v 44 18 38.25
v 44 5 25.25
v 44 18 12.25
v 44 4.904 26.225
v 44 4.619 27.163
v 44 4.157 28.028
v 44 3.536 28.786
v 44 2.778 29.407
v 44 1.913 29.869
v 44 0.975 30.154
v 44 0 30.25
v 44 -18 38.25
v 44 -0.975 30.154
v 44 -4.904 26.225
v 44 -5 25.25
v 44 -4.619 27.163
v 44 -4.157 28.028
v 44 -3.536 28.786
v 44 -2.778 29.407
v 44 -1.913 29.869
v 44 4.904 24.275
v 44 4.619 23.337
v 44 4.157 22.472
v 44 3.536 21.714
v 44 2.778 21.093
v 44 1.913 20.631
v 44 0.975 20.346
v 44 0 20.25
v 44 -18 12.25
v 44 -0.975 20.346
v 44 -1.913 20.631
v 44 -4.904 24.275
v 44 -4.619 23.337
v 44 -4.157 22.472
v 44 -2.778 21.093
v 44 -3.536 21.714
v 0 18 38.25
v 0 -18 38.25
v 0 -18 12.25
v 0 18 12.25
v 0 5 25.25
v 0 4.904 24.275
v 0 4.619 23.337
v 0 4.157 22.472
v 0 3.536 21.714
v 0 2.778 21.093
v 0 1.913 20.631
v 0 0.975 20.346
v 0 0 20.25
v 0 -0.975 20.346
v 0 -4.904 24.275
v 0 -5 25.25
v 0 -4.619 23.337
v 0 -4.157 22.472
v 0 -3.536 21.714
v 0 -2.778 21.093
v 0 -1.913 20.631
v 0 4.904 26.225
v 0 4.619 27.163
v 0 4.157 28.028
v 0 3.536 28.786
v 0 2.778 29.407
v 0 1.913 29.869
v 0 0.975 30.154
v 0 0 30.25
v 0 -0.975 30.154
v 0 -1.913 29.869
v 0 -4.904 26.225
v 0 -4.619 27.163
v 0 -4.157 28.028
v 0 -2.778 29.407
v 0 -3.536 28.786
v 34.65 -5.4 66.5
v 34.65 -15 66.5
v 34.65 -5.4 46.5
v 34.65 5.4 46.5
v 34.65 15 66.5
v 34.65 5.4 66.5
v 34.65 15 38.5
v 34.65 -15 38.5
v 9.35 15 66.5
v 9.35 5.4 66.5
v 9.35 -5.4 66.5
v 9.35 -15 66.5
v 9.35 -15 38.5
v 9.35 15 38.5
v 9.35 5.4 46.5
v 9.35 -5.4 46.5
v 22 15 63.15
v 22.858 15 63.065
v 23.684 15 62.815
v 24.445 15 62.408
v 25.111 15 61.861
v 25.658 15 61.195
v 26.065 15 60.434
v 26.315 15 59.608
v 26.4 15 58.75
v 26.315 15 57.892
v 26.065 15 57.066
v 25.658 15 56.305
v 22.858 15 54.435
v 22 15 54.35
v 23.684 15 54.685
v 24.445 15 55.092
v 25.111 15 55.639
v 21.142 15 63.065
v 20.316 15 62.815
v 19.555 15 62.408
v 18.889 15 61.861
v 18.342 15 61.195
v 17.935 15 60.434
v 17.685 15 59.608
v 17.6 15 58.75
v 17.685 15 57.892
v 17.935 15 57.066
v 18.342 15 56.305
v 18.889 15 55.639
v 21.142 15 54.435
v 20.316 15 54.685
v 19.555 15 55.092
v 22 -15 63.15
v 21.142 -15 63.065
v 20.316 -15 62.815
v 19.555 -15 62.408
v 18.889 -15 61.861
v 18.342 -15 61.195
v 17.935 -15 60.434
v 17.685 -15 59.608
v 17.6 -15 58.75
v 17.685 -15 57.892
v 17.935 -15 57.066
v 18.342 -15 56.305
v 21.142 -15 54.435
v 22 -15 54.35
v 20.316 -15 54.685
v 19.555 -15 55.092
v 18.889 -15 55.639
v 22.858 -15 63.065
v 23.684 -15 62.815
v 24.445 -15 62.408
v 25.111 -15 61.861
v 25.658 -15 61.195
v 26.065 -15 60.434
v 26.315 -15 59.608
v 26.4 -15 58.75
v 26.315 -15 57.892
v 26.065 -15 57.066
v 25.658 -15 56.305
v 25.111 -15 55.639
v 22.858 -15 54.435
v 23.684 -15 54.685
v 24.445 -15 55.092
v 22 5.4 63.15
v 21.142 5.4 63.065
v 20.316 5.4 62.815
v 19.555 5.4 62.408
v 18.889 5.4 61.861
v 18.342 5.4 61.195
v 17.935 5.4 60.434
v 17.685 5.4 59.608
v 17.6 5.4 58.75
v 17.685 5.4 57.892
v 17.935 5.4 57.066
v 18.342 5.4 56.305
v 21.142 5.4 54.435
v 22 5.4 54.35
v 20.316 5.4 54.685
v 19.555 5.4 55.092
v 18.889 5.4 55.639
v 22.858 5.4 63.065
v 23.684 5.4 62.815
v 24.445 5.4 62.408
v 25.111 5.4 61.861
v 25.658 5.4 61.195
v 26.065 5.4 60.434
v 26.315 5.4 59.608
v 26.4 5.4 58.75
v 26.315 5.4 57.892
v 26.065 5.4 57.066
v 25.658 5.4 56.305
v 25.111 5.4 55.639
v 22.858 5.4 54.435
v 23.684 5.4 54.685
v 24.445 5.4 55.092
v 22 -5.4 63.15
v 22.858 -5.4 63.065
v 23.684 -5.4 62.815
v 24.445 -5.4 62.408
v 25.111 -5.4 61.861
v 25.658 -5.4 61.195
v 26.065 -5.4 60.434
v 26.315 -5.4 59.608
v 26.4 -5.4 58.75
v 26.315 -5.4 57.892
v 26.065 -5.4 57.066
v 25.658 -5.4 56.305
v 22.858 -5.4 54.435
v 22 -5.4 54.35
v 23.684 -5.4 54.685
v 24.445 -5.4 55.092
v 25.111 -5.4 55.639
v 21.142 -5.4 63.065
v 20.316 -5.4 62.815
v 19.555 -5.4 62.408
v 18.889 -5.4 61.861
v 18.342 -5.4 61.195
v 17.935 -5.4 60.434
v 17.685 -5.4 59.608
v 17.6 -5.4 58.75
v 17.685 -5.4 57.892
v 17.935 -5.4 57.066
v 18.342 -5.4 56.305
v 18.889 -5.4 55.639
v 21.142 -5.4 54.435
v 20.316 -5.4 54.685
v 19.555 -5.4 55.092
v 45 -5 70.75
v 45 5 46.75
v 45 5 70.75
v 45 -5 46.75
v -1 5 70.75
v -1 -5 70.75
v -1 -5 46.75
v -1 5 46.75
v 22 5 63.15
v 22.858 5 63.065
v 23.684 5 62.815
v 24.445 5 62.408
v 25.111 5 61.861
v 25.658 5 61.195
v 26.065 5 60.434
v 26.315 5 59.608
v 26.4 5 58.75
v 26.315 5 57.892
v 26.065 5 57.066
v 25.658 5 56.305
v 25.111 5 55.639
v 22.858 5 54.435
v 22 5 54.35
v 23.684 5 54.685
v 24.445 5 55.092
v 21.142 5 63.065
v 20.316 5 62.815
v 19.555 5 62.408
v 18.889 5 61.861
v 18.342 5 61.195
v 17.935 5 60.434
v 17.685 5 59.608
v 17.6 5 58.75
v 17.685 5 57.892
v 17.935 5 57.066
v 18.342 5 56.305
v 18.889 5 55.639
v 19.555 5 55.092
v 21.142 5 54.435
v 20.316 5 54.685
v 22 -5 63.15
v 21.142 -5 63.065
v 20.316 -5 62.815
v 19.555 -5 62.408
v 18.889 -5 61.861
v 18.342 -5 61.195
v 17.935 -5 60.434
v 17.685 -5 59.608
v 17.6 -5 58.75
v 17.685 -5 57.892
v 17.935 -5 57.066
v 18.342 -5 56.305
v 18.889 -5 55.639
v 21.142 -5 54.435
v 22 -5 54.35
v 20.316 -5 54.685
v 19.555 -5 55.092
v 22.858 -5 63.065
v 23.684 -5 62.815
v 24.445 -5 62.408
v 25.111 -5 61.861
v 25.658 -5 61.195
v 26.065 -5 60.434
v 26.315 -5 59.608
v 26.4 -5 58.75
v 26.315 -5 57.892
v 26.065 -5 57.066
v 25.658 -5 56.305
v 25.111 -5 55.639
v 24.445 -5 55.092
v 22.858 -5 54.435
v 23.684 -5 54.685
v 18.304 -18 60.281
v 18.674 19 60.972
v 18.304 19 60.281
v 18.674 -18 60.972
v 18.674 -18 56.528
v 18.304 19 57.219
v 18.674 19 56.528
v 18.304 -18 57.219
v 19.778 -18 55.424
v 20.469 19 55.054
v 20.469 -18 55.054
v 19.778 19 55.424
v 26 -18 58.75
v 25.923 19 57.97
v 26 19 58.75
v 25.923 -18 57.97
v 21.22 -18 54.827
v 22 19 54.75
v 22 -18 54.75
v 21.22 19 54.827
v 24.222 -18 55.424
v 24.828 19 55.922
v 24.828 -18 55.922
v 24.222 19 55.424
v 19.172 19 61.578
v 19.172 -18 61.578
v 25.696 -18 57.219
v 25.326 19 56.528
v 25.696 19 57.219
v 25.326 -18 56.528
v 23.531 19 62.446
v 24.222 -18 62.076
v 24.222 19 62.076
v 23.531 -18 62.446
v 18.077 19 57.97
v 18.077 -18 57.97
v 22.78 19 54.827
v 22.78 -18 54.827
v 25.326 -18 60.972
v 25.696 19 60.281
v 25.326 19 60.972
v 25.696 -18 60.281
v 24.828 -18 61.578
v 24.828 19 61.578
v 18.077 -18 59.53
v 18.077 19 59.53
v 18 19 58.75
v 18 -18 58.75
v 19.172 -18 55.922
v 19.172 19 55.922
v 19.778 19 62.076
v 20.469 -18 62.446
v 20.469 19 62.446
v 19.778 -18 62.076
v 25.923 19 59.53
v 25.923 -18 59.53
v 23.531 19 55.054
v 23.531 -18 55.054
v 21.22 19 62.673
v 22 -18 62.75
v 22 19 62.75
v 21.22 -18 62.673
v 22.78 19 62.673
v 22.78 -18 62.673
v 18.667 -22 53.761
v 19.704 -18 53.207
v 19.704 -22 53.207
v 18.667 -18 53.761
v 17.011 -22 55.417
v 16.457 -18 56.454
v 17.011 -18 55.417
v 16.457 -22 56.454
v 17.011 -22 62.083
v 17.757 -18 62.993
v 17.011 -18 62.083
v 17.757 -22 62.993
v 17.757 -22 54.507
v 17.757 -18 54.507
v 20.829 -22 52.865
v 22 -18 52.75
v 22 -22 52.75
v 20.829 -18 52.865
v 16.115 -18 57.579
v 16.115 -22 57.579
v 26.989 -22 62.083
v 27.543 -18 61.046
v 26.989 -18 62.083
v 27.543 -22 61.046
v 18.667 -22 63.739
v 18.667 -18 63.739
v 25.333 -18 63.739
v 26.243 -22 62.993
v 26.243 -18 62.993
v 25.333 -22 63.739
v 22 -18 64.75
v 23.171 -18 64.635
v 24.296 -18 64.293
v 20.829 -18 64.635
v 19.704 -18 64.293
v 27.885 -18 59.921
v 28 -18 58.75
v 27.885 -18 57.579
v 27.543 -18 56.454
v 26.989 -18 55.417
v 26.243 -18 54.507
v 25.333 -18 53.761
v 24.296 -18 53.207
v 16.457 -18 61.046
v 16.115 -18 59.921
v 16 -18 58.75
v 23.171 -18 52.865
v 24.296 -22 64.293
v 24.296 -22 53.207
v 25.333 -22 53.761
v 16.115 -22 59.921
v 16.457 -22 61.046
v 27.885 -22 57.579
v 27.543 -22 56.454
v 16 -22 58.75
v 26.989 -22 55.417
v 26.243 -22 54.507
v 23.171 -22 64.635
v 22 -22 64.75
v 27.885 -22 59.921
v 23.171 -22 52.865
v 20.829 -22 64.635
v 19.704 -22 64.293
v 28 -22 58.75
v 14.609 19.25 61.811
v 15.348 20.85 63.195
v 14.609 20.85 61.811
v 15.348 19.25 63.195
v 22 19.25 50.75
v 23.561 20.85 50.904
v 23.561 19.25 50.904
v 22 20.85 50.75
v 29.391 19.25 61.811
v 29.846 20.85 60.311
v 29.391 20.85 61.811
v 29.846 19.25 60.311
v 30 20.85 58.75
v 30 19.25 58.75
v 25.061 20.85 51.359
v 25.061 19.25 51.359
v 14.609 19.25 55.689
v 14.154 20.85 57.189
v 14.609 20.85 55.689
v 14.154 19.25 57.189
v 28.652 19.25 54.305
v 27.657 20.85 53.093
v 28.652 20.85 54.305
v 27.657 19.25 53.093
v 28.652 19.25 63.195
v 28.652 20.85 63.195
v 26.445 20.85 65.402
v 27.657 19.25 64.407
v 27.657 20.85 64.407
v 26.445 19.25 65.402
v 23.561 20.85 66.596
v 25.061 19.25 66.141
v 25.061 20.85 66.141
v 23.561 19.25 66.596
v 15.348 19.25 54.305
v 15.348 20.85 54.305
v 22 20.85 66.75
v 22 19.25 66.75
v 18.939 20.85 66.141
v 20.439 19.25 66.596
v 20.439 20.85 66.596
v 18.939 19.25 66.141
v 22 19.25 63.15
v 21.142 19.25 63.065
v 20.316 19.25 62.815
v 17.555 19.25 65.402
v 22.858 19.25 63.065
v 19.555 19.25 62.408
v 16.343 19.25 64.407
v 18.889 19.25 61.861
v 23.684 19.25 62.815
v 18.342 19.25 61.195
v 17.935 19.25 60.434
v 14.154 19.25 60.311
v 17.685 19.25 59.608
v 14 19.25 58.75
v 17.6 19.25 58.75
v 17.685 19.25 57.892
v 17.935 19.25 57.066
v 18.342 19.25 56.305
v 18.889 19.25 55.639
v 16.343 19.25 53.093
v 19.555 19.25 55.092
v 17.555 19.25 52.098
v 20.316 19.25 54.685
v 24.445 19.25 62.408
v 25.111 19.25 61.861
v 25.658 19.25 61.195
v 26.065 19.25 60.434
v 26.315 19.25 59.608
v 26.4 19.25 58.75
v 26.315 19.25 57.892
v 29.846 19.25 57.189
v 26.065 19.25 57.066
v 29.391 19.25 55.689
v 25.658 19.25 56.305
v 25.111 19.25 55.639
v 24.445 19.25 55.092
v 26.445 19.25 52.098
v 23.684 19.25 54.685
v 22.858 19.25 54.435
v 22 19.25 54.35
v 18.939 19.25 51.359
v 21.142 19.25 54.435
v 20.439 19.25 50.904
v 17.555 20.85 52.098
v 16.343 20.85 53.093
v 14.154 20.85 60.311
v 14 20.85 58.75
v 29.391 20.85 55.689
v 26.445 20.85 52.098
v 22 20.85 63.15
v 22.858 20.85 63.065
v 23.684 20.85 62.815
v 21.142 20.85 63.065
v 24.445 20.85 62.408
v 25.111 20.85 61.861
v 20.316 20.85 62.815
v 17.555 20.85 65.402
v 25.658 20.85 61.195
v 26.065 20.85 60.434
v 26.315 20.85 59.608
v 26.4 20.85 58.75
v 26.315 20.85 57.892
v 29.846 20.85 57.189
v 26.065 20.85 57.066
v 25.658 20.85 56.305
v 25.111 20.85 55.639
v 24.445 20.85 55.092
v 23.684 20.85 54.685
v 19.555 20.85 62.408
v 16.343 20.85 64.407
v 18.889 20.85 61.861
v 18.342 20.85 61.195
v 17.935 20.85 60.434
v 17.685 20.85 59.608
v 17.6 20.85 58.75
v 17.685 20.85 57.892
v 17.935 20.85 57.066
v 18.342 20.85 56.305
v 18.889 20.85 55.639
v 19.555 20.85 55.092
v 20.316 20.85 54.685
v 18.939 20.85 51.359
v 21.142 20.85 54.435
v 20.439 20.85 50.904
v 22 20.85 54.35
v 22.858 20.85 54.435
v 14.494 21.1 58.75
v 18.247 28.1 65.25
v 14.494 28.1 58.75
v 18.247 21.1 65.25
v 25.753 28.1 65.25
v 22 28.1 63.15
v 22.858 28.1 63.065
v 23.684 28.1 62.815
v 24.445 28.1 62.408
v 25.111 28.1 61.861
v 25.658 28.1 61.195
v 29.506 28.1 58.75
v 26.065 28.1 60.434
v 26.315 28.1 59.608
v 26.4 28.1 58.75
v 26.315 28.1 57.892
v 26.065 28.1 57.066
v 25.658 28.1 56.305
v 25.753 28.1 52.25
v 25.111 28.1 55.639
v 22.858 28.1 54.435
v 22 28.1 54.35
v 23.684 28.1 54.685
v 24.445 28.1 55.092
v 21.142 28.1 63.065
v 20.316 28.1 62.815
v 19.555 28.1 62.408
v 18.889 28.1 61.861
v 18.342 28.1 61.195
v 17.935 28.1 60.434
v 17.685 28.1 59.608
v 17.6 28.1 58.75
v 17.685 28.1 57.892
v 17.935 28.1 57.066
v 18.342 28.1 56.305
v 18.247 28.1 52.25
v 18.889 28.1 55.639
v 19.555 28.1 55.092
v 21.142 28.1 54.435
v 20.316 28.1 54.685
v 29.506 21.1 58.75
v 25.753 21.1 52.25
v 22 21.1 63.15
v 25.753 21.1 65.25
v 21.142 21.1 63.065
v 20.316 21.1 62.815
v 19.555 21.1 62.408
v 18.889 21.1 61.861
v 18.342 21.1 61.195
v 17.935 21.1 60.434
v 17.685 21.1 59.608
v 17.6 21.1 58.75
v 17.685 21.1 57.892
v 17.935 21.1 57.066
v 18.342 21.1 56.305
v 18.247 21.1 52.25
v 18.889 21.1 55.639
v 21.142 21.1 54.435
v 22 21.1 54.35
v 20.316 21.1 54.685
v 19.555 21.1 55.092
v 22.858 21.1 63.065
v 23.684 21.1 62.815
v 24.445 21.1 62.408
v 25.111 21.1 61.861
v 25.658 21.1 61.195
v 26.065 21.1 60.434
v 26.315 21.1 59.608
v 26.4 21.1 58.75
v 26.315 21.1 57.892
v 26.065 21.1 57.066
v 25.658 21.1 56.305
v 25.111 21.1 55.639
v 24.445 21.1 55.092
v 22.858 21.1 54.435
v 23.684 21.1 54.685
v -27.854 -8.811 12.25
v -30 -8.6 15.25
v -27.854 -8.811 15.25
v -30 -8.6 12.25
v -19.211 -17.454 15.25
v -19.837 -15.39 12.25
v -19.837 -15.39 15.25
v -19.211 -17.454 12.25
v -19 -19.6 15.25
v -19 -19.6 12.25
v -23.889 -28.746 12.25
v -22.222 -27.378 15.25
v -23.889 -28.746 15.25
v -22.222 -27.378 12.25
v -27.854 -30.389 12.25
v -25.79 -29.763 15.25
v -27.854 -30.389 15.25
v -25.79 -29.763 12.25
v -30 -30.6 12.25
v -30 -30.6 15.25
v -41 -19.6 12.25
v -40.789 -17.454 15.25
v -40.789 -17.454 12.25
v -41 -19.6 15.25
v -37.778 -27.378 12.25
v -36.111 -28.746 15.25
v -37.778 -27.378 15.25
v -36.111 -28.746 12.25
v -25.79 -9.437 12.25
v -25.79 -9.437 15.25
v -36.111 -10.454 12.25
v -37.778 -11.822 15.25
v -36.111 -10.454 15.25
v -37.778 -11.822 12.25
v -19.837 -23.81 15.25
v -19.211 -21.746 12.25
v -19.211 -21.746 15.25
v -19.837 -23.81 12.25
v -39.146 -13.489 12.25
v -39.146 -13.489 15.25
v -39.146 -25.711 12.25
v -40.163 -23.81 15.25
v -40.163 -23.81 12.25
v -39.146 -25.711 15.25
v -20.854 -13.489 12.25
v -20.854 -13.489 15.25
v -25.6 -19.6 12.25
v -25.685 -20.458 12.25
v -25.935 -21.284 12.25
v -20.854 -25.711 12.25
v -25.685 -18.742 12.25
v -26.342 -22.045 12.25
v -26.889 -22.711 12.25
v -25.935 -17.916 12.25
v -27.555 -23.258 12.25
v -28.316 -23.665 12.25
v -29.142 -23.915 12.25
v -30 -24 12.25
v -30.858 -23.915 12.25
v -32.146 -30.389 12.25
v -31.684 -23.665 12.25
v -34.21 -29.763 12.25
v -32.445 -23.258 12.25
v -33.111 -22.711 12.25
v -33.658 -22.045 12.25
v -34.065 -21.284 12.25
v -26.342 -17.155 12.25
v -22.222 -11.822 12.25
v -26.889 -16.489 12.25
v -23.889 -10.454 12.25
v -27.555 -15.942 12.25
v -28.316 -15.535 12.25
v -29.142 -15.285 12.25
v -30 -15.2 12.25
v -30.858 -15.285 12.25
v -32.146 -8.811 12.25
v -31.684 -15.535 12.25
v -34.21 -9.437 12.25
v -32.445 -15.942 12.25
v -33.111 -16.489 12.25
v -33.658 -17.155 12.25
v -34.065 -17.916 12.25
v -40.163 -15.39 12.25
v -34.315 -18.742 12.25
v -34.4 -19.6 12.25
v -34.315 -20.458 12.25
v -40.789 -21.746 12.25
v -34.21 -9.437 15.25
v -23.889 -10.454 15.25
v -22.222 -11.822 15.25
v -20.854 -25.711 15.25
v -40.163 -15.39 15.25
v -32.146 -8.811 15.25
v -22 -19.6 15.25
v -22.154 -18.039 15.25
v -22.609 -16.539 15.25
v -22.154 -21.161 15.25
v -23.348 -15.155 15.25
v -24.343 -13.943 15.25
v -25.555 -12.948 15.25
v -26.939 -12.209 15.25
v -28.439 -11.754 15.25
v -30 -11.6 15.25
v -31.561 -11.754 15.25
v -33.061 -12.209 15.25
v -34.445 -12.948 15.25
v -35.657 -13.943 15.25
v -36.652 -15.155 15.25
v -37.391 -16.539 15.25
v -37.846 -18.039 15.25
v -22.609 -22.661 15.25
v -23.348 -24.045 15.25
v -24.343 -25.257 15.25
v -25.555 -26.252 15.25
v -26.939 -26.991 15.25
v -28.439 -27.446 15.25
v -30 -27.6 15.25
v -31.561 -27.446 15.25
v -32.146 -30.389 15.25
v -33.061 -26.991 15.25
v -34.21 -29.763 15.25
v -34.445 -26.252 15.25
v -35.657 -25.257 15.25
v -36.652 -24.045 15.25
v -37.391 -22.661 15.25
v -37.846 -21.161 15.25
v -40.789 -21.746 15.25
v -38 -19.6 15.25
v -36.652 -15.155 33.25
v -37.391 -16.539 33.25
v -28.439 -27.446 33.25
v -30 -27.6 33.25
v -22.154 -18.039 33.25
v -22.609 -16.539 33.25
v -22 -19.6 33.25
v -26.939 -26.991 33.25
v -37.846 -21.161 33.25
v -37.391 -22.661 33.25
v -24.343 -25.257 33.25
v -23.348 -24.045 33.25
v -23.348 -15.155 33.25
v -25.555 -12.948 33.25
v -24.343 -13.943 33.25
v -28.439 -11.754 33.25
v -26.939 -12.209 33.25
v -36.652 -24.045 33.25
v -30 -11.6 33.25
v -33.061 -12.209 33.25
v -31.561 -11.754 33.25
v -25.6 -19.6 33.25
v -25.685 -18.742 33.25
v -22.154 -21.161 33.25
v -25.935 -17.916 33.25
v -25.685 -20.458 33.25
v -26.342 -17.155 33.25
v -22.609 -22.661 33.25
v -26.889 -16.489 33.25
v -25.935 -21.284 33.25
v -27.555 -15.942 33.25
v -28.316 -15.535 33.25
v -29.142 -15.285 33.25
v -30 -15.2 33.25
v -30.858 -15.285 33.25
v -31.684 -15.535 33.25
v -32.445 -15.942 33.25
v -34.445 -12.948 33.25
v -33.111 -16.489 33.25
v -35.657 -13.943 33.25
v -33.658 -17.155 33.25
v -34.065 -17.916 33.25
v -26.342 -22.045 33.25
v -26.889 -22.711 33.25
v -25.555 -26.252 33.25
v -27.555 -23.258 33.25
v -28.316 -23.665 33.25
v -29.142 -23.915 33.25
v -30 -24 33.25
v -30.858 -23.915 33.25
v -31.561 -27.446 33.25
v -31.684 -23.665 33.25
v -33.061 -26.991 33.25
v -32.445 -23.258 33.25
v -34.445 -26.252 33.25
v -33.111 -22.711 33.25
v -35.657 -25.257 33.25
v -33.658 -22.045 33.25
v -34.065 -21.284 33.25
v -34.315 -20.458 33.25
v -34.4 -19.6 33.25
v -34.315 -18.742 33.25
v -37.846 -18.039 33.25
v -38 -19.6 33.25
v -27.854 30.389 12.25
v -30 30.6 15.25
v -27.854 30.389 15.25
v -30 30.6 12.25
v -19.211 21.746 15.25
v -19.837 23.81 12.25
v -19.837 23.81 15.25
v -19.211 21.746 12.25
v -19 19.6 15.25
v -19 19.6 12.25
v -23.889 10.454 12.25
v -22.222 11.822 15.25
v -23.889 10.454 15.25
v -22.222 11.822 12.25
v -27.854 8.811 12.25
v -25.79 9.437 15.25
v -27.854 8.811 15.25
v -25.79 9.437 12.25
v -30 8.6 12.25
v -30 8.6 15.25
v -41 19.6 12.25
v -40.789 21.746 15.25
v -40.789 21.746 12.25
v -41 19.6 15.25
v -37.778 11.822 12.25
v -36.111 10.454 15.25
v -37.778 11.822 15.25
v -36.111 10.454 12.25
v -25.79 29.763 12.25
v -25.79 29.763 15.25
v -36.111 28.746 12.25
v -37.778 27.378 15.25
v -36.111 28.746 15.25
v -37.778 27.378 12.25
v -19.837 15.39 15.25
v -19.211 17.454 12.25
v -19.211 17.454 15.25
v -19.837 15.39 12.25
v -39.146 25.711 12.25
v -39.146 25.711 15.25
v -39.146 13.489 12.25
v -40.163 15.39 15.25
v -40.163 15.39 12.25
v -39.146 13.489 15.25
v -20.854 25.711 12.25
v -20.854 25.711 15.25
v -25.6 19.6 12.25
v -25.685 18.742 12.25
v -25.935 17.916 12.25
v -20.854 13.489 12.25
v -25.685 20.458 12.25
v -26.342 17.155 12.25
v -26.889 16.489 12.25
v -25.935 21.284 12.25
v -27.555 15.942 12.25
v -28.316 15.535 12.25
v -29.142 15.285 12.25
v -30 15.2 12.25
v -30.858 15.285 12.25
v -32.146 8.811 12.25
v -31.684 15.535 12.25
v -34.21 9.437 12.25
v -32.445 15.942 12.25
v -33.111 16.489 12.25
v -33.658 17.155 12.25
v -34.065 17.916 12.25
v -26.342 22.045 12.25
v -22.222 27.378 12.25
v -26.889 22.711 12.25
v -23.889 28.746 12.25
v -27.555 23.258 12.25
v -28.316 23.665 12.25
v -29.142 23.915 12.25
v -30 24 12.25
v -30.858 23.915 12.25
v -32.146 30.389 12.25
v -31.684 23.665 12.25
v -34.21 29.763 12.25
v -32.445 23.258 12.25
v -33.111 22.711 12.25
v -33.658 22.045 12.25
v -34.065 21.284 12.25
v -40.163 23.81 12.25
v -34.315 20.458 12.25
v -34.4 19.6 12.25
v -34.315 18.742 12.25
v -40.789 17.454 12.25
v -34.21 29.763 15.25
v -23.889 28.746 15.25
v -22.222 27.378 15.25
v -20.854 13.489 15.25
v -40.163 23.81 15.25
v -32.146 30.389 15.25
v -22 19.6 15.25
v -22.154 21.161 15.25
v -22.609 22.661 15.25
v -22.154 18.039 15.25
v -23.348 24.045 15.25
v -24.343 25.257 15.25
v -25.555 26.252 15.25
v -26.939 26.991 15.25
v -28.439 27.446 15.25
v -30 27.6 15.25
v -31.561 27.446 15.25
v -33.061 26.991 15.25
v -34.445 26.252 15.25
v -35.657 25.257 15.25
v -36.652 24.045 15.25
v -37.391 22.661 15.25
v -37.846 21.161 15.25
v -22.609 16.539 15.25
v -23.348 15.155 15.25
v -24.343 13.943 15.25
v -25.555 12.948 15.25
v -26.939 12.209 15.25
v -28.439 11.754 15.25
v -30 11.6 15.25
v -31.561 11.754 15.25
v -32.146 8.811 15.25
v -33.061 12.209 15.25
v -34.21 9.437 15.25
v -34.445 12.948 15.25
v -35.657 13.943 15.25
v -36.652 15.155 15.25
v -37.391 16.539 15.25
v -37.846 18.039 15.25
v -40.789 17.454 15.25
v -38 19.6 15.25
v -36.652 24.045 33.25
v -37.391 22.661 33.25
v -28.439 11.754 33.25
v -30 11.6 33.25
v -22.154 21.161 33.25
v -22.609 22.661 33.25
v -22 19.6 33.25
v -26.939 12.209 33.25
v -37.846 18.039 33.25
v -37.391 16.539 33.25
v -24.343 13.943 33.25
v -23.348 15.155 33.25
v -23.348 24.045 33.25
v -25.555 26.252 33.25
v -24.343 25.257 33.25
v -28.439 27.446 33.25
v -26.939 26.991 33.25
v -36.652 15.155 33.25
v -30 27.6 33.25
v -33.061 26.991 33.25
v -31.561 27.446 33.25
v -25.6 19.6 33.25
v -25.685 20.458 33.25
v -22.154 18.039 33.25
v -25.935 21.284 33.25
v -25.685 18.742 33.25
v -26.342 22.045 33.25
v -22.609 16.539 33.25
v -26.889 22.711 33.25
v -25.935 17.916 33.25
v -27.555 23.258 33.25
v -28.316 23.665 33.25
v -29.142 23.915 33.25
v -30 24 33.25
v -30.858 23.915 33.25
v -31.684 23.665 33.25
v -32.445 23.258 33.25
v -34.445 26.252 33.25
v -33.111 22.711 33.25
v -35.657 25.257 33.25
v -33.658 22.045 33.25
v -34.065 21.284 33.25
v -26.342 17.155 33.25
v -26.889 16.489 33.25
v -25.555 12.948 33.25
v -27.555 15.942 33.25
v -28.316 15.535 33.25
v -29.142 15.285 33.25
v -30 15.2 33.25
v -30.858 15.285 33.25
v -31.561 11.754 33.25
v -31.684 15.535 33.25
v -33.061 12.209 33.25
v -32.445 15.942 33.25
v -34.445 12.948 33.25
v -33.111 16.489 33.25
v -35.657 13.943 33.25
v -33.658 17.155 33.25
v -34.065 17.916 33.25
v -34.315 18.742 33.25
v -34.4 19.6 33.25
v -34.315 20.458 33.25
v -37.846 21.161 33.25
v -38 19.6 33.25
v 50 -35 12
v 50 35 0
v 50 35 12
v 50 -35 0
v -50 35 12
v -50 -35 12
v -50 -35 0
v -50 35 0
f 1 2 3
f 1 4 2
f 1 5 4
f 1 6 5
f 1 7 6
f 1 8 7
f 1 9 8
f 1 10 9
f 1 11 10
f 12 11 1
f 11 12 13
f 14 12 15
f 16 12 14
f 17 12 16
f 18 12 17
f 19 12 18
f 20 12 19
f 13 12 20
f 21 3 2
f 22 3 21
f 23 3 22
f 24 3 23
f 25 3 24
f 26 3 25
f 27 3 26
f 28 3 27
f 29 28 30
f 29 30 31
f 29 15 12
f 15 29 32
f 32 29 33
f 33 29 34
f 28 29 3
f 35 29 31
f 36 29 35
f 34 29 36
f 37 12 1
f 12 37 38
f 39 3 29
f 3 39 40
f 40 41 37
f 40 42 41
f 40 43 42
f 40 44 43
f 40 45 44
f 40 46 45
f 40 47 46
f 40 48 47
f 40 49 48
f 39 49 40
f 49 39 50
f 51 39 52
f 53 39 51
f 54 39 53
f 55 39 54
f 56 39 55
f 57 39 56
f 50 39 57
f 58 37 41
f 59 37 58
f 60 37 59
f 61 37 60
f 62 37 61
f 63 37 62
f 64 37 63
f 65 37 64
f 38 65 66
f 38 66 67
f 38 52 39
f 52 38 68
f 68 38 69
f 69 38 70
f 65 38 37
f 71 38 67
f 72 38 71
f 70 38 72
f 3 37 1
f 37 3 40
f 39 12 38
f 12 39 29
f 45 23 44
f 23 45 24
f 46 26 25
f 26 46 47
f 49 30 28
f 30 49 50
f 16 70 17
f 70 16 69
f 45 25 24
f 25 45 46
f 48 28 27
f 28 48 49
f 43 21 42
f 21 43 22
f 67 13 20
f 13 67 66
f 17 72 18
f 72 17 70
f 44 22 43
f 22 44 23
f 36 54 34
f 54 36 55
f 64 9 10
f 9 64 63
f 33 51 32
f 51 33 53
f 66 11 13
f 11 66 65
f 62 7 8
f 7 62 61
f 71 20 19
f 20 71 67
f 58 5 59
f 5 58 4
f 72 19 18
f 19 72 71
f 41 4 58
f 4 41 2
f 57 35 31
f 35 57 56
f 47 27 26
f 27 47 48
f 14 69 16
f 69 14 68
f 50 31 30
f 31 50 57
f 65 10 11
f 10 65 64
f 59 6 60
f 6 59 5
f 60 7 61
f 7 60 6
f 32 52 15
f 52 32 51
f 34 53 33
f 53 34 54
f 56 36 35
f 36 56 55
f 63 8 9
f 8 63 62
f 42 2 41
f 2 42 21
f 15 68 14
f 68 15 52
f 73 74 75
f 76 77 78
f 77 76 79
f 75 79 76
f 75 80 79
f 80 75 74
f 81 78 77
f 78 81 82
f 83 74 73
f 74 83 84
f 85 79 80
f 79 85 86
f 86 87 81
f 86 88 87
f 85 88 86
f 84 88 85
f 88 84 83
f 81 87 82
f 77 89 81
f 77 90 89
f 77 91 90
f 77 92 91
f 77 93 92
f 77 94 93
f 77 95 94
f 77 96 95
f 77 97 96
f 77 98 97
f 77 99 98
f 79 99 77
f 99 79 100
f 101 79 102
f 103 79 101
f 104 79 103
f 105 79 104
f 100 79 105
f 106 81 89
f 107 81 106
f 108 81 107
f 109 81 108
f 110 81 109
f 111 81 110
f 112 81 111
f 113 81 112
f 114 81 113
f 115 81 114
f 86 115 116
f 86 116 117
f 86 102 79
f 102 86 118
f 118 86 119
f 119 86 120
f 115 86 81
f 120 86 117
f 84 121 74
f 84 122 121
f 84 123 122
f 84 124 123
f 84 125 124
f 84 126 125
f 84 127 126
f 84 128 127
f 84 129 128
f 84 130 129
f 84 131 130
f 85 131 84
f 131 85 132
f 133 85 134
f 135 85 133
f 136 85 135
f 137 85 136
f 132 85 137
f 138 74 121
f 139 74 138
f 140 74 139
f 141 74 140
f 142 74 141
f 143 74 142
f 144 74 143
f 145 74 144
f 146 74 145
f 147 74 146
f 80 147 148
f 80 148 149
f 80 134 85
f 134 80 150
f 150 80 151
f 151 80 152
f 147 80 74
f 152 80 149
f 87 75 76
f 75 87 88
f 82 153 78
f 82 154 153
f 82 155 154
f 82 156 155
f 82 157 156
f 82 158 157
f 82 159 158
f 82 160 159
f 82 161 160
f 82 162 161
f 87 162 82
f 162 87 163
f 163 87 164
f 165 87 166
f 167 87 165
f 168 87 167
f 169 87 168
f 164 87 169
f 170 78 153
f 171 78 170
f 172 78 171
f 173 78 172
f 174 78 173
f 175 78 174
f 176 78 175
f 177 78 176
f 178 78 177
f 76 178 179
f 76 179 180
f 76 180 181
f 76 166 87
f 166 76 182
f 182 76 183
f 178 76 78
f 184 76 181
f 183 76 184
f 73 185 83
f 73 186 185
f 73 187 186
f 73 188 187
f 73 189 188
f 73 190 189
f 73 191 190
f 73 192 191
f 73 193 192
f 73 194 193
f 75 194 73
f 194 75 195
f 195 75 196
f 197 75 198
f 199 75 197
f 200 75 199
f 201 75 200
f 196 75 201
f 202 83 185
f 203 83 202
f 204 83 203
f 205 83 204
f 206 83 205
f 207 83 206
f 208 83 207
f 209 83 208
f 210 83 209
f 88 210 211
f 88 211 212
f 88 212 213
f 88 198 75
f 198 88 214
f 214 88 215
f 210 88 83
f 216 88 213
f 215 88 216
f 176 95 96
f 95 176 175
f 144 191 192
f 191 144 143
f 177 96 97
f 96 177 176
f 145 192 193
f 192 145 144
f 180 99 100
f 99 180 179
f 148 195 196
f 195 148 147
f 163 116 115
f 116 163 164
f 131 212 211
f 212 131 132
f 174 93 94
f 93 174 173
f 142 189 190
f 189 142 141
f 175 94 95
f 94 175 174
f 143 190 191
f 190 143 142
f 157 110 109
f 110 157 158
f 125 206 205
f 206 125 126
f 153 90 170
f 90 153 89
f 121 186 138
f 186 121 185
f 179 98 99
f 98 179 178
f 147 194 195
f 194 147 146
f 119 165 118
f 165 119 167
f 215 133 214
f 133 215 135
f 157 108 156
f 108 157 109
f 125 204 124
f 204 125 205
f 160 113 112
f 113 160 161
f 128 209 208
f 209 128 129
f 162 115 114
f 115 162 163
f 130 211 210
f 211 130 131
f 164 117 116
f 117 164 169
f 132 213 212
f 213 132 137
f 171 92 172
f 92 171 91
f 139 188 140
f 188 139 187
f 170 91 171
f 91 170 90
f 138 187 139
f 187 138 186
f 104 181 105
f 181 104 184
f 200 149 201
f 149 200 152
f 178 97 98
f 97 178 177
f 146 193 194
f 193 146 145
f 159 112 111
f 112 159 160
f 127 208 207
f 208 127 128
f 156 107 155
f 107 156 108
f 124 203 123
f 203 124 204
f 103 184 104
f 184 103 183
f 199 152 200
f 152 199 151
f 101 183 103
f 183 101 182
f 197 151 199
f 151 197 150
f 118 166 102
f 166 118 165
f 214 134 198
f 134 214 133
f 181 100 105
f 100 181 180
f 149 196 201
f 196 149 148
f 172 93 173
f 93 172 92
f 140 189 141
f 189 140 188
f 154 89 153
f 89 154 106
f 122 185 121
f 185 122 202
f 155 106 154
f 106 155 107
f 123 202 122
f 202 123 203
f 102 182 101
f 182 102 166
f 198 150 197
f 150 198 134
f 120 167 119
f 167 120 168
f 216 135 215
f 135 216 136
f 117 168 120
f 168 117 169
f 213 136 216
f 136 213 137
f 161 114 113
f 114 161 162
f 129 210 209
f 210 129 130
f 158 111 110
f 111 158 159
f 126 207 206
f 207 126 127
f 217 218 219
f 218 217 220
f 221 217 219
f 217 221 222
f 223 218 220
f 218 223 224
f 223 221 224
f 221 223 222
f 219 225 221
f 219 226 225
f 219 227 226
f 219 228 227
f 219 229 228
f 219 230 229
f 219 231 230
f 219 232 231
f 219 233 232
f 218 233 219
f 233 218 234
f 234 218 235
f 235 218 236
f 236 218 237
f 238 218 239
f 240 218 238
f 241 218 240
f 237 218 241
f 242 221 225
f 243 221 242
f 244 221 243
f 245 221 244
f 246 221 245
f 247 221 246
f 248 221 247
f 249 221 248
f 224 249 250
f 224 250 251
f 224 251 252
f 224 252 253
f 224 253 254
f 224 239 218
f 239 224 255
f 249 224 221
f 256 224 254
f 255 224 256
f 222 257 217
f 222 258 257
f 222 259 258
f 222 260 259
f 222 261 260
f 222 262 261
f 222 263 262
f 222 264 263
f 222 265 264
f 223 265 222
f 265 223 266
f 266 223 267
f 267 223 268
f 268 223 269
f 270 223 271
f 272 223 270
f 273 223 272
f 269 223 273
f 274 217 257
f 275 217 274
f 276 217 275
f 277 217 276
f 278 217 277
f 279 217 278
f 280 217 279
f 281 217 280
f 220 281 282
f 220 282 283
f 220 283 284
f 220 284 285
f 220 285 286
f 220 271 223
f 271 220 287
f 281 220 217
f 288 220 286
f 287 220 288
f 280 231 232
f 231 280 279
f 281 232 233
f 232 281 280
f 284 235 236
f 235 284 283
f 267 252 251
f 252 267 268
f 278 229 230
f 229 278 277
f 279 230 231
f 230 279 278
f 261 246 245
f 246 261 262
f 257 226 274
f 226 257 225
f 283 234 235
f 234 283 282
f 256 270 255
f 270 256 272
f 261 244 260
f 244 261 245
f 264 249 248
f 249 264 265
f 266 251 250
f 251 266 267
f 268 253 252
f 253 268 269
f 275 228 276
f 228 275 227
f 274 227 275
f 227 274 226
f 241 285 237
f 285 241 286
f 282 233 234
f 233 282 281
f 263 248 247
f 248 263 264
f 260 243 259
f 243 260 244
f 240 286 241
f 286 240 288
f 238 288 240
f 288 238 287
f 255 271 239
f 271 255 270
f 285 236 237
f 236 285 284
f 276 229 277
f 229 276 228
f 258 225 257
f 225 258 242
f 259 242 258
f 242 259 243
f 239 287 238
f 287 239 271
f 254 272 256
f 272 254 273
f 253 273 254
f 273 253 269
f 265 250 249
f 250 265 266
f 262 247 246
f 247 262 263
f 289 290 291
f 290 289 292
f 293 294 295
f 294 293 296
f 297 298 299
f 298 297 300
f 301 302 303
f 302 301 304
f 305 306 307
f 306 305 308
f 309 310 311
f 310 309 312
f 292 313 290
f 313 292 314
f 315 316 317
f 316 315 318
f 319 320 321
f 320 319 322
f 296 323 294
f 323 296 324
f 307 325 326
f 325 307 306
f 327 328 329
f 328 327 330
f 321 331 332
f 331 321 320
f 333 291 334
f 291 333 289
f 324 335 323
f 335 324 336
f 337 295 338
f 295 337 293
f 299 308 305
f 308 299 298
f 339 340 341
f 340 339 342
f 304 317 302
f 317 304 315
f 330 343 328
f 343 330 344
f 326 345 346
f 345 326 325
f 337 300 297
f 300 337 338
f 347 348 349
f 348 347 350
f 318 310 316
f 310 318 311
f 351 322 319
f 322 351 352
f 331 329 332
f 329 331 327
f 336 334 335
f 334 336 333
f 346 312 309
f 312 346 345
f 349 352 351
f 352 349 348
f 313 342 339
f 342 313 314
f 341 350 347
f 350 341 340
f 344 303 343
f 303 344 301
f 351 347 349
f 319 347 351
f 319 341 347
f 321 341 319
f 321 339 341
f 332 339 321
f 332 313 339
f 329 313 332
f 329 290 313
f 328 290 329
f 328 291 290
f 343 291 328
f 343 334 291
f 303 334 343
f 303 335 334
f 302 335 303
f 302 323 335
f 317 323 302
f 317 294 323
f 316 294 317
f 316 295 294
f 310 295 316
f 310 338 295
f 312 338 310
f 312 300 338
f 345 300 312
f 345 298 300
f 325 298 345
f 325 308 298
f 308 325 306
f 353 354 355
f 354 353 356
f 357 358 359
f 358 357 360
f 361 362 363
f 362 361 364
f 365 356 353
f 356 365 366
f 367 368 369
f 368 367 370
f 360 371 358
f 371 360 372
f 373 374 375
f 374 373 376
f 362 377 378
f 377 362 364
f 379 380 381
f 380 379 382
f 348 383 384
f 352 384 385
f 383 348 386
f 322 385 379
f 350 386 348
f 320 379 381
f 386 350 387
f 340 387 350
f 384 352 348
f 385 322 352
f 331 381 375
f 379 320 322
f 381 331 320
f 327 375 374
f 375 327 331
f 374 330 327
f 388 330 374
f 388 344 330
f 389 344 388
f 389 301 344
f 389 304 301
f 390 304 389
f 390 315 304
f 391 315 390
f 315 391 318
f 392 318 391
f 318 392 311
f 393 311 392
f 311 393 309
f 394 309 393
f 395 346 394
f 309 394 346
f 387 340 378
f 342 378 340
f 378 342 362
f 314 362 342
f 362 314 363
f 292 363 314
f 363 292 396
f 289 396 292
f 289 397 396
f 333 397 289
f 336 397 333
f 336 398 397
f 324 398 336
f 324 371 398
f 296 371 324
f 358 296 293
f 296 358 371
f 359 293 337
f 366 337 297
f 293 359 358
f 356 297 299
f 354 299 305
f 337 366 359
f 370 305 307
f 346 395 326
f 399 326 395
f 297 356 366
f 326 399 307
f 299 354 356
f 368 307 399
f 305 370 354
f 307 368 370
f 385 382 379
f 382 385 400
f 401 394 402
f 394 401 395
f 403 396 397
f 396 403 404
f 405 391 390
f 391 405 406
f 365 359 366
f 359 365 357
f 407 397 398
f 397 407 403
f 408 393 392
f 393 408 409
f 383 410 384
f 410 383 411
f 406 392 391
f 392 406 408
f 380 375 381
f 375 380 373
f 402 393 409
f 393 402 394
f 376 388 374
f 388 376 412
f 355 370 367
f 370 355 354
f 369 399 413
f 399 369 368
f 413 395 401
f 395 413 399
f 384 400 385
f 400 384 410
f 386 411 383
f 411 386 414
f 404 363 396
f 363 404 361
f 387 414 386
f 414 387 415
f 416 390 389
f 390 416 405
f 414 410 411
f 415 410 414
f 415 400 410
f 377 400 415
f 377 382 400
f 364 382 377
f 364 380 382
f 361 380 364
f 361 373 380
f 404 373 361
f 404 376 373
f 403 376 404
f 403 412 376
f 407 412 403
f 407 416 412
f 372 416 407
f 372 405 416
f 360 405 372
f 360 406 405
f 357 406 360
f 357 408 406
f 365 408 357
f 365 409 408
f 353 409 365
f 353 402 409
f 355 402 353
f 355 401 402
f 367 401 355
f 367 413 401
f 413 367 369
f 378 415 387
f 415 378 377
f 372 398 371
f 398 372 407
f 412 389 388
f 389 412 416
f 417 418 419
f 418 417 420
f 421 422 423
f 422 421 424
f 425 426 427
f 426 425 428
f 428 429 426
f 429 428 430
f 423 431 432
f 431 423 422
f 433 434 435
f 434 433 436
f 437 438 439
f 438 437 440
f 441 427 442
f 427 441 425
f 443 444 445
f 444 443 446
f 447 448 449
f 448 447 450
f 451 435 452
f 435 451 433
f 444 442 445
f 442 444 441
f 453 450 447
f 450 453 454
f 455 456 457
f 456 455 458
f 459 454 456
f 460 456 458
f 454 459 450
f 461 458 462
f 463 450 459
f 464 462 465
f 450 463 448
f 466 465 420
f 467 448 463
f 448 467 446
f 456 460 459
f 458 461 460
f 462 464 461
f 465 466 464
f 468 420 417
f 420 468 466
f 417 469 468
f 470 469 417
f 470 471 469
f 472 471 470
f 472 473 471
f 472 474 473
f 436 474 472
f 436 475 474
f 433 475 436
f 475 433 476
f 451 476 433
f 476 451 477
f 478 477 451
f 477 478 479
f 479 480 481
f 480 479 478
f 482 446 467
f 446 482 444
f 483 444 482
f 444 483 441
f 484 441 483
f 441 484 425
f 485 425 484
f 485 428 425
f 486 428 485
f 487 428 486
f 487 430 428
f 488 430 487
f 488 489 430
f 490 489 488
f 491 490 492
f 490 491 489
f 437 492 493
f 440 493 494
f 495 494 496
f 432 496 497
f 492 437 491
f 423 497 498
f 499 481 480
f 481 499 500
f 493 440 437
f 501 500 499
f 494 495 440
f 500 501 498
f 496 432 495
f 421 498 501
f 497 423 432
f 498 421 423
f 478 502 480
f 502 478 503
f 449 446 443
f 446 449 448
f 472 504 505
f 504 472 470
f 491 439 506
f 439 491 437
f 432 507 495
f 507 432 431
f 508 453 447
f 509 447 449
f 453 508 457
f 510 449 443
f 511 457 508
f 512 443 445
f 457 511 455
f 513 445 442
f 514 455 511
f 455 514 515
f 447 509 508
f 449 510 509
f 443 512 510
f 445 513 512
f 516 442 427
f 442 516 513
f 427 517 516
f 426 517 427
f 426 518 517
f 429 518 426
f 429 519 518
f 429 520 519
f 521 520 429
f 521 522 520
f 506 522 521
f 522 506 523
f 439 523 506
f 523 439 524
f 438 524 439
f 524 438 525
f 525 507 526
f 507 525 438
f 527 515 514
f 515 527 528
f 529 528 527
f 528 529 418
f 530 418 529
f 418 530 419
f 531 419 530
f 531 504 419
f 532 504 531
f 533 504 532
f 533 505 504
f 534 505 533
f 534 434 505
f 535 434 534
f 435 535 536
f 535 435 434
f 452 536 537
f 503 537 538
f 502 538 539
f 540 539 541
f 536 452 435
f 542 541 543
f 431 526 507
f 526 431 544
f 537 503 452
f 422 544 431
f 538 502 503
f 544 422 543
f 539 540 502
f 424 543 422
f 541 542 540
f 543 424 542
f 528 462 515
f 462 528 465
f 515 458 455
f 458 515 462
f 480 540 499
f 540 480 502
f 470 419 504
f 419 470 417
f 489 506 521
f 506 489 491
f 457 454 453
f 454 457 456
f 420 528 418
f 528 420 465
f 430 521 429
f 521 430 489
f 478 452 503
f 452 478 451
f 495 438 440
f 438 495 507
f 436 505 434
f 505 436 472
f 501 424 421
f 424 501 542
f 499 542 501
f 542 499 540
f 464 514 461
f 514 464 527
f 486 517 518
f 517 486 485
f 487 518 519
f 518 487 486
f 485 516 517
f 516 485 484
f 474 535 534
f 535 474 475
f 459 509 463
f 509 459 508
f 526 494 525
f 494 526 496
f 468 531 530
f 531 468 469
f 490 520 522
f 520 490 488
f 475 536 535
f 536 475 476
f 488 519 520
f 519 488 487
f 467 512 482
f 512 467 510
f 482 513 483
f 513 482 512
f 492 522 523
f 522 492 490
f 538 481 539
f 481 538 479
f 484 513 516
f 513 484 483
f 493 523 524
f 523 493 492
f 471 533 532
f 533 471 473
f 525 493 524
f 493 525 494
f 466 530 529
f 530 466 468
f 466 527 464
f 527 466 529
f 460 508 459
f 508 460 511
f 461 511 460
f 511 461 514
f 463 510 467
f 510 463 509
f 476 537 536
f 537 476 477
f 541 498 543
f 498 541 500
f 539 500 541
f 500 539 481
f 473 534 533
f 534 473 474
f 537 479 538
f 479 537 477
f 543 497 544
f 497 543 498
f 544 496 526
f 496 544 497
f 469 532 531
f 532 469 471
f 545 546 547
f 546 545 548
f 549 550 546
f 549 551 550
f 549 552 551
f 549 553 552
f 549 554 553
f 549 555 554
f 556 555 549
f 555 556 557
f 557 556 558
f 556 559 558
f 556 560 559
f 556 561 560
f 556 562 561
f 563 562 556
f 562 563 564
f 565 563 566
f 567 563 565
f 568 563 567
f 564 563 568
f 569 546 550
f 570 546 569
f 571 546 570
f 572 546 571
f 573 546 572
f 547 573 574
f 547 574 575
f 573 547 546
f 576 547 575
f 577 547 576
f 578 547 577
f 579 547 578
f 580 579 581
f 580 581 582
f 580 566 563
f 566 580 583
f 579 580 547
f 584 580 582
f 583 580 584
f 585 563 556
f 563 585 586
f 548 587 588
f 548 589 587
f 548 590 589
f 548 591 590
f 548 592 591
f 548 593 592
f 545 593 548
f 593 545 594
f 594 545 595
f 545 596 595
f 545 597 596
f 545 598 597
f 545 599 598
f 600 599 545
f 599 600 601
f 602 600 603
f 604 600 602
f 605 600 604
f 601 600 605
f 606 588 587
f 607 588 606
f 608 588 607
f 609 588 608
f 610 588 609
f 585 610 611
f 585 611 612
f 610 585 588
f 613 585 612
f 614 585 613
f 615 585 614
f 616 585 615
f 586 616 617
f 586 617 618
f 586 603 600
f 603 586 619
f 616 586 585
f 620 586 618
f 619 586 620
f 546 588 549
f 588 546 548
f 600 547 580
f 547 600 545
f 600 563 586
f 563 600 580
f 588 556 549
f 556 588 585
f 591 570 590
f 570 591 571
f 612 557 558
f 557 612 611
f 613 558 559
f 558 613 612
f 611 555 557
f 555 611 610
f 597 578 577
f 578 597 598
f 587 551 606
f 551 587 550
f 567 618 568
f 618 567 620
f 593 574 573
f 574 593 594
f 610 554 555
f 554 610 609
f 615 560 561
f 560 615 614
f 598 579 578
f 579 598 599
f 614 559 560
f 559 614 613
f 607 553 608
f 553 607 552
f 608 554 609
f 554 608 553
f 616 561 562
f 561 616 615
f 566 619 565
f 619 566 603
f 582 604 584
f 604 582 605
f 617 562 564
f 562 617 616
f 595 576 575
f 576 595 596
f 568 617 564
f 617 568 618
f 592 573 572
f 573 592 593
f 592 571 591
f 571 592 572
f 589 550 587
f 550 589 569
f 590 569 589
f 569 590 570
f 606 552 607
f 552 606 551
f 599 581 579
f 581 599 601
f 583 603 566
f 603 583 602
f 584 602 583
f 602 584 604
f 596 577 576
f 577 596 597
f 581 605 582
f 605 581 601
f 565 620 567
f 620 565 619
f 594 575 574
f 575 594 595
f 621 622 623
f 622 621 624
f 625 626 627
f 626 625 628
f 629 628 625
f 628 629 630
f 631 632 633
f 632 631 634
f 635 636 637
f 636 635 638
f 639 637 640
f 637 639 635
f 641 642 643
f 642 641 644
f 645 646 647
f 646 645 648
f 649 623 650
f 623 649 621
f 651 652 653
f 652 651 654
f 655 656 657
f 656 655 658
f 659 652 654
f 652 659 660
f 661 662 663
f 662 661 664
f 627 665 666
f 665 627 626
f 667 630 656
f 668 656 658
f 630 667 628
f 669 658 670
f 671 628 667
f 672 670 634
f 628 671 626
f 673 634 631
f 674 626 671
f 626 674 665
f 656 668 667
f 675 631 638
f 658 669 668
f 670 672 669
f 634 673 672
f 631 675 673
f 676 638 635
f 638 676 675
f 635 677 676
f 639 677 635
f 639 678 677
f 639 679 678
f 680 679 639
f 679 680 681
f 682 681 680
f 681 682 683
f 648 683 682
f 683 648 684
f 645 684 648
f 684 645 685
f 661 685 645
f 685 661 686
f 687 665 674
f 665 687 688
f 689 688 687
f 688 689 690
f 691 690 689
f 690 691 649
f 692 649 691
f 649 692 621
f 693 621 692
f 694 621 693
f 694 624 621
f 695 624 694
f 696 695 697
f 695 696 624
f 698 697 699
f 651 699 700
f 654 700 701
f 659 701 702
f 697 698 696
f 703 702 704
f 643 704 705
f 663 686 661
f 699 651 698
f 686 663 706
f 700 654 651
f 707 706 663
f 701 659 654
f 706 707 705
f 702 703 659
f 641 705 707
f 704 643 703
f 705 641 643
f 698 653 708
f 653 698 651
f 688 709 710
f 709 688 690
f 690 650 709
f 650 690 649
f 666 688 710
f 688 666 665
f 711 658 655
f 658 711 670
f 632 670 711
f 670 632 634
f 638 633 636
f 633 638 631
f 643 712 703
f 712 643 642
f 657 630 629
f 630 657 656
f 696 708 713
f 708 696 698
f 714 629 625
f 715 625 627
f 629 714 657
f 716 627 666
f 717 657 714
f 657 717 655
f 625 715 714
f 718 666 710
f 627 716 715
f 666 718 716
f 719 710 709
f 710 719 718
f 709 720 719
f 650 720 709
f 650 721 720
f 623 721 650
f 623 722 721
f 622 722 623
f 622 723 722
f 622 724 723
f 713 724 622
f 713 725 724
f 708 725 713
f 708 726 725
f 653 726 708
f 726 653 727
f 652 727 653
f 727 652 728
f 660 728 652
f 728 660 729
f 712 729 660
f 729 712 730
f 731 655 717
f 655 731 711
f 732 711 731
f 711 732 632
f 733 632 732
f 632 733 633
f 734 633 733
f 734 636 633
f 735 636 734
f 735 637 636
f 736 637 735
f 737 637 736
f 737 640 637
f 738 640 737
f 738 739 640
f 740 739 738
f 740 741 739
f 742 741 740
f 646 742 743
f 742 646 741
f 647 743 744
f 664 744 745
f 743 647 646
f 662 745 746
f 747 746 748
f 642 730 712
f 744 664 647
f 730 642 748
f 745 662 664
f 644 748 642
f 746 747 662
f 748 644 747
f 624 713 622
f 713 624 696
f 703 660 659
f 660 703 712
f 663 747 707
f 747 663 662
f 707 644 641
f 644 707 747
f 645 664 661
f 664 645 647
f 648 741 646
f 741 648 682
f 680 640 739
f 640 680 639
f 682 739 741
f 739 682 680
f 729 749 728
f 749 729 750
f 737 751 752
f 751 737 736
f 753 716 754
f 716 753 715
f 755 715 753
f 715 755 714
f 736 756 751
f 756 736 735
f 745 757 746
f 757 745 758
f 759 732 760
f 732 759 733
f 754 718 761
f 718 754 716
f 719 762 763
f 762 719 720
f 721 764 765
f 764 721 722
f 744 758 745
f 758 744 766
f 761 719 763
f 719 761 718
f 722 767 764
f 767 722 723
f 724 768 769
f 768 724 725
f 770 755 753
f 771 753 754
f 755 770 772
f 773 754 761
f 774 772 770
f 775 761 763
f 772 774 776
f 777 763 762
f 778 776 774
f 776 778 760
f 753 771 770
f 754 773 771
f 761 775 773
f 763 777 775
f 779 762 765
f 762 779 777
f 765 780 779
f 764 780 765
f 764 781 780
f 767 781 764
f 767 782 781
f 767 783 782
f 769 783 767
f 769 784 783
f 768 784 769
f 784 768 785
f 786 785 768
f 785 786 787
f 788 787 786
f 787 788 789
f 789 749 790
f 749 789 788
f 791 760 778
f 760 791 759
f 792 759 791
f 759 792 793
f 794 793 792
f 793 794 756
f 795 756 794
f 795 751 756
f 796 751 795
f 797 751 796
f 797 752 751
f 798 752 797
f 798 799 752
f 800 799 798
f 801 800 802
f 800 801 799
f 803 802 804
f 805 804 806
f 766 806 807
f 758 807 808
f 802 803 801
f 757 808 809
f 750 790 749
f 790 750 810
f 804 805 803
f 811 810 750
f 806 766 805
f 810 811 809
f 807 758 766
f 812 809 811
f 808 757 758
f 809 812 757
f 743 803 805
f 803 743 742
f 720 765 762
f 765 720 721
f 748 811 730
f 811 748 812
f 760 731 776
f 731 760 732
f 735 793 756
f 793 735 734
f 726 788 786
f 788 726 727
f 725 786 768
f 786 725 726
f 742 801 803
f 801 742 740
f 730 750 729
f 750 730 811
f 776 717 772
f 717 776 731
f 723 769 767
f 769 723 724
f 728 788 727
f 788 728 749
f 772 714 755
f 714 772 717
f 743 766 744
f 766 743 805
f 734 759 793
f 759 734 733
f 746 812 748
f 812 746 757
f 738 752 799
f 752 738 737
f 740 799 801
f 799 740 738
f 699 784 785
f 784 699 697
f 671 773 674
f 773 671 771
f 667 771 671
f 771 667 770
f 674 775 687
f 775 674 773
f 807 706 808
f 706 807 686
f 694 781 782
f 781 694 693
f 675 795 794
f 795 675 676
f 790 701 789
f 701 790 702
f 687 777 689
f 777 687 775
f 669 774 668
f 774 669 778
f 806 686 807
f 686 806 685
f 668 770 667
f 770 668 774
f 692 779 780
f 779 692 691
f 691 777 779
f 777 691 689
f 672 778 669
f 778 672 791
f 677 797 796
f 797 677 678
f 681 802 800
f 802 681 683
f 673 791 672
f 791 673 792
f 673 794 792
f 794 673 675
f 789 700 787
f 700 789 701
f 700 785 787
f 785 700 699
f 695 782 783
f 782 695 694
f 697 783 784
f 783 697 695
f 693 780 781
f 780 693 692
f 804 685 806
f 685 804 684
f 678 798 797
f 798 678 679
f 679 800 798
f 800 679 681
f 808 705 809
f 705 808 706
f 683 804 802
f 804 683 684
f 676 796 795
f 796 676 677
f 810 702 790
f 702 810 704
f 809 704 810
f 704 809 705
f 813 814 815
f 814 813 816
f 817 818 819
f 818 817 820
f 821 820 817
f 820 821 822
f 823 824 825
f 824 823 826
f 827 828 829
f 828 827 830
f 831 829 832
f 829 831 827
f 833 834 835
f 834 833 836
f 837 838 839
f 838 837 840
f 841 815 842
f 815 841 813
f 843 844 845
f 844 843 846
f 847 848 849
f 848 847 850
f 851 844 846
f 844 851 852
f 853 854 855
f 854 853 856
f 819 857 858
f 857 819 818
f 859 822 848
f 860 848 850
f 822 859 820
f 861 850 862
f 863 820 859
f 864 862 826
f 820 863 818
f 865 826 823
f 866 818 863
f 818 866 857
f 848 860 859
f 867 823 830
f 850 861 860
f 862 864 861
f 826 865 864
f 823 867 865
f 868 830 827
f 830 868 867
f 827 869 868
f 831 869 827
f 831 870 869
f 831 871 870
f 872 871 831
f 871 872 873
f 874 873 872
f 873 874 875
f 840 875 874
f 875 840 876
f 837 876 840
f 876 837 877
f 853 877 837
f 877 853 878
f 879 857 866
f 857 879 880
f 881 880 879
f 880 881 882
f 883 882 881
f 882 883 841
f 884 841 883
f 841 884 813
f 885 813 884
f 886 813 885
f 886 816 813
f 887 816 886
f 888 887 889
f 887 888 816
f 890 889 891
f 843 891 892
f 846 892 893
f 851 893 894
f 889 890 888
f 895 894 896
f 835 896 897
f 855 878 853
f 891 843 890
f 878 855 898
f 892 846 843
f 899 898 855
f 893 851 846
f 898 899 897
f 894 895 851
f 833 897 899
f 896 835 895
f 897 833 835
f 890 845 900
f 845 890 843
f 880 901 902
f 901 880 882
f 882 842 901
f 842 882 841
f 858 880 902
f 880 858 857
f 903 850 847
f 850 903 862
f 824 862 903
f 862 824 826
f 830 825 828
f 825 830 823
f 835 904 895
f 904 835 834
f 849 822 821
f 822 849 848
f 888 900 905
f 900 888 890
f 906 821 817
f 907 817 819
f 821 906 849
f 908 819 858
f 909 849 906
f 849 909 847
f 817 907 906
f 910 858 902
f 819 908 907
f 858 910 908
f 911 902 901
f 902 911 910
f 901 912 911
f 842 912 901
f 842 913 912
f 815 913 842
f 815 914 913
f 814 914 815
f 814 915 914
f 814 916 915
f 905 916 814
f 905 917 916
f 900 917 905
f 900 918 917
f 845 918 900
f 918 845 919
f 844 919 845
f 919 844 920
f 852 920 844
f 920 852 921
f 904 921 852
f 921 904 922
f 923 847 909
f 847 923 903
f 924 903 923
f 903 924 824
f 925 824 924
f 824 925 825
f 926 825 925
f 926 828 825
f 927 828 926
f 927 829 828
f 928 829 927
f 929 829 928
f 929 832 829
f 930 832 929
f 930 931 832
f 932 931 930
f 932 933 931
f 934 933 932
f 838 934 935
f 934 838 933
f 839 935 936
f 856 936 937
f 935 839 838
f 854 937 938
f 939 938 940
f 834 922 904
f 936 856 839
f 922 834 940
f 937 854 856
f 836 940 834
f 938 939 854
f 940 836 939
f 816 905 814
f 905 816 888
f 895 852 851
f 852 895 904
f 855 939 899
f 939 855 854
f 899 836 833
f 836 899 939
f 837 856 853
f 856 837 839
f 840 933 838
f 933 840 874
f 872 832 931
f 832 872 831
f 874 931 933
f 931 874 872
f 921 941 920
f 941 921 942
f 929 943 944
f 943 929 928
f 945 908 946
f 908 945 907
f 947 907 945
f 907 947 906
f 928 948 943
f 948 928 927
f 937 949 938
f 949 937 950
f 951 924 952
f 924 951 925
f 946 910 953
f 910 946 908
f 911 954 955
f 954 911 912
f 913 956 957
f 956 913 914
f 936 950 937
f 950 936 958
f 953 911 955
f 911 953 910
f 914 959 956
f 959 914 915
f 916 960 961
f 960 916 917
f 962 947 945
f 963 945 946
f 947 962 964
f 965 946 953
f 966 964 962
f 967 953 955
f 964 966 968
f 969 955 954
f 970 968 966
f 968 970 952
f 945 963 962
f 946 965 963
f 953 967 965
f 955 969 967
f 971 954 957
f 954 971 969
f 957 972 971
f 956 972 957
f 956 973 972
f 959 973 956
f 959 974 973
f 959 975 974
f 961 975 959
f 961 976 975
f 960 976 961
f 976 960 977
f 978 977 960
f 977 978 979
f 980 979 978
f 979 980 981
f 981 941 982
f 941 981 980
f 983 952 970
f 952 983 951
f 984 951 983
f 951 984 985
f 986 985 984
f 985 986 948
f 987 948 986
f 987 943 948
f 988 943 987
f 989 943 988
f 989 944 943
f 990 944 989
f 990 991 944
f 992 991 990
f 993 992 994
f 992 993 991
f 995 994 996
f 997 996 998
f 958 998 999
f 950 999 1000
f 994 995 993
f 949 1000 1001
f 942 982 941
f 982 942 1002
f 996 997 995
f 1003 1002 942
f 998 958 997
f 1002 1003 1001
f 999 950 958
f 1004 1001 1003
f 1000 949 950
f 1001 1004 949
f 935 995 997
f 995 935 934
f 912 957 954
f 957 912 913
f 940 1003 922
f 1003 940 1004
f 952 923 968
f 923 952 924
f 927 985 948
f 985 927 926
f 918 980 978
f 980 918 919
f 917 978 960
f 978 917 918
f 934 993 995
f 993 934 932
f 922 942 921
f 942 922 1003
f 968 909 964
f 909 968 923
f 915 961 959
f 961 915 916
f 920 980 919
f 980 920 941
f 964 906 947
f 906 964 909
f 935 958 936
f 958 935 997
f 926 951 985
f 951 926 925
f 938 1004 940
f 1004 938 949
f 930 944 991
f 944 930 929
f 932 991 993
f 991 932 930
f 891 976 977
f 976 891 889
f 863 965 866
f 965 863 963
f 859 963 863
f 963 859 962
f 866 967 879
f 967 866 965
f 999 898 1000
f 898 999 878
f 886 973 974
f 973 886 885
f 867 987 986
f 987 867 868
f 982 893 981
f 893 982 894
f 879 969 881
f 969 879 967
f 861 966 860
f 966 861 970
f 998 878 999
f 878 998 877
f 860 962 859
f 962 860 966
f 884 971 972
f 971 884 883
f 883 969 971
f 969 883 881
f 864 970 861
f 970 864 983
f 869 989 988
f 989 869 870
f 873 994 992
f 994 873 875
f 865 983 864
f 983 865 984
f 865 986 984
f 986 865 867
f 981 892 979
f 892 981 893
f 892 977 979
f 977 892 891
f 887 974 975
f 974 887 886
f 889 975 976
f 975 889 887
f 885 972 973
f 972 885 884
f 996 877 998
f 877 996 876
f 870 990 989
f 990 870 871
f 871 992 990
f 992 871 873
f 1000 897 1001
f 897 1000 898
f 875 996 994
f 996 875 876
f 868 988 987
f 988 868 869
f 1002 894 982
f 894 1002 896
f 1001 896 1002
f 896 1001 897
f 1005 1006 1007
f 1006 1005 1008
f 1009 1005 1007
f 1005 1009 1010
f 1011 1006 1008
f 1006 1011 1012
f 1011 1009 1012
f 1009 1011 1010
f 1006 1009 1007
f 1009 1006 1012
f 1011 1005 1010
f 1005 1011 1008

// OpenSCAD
$fn = 32;

// ------------------------------------------------------------------------
// Indexing jig: plate 100 x 70 mm, pin d8
// Every part is its own module, assembly() places every instance.
// ------------------------------------------------------------------------

// --- part 1 ---
module jig_plate() {
  difference() {
    translate([-50, -35, 0]) cube([100, 70, 12]);
  }
}

// --- part 2 ---
module locator_block() {
  difference() {
    translate([-22, -18, 0]) cube([44, 36, 26]);
    translate([0, 0, 13]) rotate([0, 90, 0]) cylinder(h = 46, d = 10, center = true);
  }
}

// --- part 3 ---
module index_fork() {
  difference() {
    translate([-12.65, -15, 0]) cube([25.3, 30, 28]);
    translate([-13.65, -5.4, 8]) cube([27.3, 10.8, 21]);
    translate([0, 0, 20.25]) rotate([90, 0, 0]) cylinder(h = 32, d = 8.8, center = true);
  }
}

// --- part 4 ---
module index_arm() {
  difference() {
    translate([-23, -5, 0]) cube([46, 10, 24]);
    translate([0, 0, 12]) rotate([90, 0, 0]) cylinder(h = 12, d = 8.8, center = true);
  }
}

// --- part 5 ---
module index_pin() {
  rotate([0, 90, 0]) cylinder(h = 38, d = 8, center = true);
  translate([-22, 0, 0]) rotate([0, 90, 0]) cylinder(h = 4, d = 12);
}

// --- part 6 ---
module pin_washer() {
  difference() {
      translate([0, 0, 0]) cylinder(h = 1.6, d = 16);
      translate([0, 0, -1]) cylinder(h = 3.6, d = 8.8);
    }
}

// --- part 7 ---
module lock_nut() {
  difference() {
    linear_extrude(height = 7) polygon(points = [[7.506, 0], [3.753, 6.5], [-3.753, 6.5], [-7.506, 0], [-3.753, -6.5], [3.753, -6.5]]);
    translate([0, 0, -1]) cylinder(h = 9, d = 8.8);
  }
}

// --- part 8 ---
module guide_bush_a() {
  difference() {
    union() {
      cylinder(h = 3, d = 22);
      translate([0, 0, 3]) cylinder(h = 18, d = 16);
    }
    translate([0, 0, -1]) cylinder(h = 23, d = 8.8);
  }
}

// --- part 9 ---
module guide_bush_b() {
  difference() {
    union() {
      cylinder(h = 3, d = 22);
      translate([0, 0, 3]) cylinder(h = 18, d = 16);
    }
    translate([0, 0, -1]) cylinder(h = 23, d = 8.8);
  }
}

// --- assembly ---
module assembly() {
  color([0.80, 0.24, 0.20]) translate([0, 0, 0]) rotate([0, 0, 0]) jig_plate();
  color([0.20, 0.45, 0.75]) translate([22, 0, 12.25]) rotate([0, 0, 0]) locator_block();
  color([0.25, 0.62, 0.32]) translate([22, 0, 38.5]) rotate([0, 0, 0]) index_fork();
  color([0.92, 0.70, 0.18]) translate([22, 0, 46.75]) rotate([0, 0, 0]) index_arm();
  color([0.58, 0.35, 0.70]) translate([22, 0, 58.75]) rotate([0, 0, 90]) index_pin();
  color([0.16, 0.66, 0.66]) translate([22, 20.85, 58.75]) rotate([90, 0, 0]) pin_washer();
  color([0.85, 0.48, 0.18]) translate([22, 28.1, 58.75]) rotate([90, 0, 0]) lock_nut();
  color([0.55, 0.60, 0.65]) translate([-30, -19.6, 12.25]) rotate([0, 0, 0]) guide_bush_a();
  color([0.75, 0.30, 0.55]) translate([-30, 19.6, 12.25]) rotate([0, 0, 0]) guide_bush_b();
}

assembly();
